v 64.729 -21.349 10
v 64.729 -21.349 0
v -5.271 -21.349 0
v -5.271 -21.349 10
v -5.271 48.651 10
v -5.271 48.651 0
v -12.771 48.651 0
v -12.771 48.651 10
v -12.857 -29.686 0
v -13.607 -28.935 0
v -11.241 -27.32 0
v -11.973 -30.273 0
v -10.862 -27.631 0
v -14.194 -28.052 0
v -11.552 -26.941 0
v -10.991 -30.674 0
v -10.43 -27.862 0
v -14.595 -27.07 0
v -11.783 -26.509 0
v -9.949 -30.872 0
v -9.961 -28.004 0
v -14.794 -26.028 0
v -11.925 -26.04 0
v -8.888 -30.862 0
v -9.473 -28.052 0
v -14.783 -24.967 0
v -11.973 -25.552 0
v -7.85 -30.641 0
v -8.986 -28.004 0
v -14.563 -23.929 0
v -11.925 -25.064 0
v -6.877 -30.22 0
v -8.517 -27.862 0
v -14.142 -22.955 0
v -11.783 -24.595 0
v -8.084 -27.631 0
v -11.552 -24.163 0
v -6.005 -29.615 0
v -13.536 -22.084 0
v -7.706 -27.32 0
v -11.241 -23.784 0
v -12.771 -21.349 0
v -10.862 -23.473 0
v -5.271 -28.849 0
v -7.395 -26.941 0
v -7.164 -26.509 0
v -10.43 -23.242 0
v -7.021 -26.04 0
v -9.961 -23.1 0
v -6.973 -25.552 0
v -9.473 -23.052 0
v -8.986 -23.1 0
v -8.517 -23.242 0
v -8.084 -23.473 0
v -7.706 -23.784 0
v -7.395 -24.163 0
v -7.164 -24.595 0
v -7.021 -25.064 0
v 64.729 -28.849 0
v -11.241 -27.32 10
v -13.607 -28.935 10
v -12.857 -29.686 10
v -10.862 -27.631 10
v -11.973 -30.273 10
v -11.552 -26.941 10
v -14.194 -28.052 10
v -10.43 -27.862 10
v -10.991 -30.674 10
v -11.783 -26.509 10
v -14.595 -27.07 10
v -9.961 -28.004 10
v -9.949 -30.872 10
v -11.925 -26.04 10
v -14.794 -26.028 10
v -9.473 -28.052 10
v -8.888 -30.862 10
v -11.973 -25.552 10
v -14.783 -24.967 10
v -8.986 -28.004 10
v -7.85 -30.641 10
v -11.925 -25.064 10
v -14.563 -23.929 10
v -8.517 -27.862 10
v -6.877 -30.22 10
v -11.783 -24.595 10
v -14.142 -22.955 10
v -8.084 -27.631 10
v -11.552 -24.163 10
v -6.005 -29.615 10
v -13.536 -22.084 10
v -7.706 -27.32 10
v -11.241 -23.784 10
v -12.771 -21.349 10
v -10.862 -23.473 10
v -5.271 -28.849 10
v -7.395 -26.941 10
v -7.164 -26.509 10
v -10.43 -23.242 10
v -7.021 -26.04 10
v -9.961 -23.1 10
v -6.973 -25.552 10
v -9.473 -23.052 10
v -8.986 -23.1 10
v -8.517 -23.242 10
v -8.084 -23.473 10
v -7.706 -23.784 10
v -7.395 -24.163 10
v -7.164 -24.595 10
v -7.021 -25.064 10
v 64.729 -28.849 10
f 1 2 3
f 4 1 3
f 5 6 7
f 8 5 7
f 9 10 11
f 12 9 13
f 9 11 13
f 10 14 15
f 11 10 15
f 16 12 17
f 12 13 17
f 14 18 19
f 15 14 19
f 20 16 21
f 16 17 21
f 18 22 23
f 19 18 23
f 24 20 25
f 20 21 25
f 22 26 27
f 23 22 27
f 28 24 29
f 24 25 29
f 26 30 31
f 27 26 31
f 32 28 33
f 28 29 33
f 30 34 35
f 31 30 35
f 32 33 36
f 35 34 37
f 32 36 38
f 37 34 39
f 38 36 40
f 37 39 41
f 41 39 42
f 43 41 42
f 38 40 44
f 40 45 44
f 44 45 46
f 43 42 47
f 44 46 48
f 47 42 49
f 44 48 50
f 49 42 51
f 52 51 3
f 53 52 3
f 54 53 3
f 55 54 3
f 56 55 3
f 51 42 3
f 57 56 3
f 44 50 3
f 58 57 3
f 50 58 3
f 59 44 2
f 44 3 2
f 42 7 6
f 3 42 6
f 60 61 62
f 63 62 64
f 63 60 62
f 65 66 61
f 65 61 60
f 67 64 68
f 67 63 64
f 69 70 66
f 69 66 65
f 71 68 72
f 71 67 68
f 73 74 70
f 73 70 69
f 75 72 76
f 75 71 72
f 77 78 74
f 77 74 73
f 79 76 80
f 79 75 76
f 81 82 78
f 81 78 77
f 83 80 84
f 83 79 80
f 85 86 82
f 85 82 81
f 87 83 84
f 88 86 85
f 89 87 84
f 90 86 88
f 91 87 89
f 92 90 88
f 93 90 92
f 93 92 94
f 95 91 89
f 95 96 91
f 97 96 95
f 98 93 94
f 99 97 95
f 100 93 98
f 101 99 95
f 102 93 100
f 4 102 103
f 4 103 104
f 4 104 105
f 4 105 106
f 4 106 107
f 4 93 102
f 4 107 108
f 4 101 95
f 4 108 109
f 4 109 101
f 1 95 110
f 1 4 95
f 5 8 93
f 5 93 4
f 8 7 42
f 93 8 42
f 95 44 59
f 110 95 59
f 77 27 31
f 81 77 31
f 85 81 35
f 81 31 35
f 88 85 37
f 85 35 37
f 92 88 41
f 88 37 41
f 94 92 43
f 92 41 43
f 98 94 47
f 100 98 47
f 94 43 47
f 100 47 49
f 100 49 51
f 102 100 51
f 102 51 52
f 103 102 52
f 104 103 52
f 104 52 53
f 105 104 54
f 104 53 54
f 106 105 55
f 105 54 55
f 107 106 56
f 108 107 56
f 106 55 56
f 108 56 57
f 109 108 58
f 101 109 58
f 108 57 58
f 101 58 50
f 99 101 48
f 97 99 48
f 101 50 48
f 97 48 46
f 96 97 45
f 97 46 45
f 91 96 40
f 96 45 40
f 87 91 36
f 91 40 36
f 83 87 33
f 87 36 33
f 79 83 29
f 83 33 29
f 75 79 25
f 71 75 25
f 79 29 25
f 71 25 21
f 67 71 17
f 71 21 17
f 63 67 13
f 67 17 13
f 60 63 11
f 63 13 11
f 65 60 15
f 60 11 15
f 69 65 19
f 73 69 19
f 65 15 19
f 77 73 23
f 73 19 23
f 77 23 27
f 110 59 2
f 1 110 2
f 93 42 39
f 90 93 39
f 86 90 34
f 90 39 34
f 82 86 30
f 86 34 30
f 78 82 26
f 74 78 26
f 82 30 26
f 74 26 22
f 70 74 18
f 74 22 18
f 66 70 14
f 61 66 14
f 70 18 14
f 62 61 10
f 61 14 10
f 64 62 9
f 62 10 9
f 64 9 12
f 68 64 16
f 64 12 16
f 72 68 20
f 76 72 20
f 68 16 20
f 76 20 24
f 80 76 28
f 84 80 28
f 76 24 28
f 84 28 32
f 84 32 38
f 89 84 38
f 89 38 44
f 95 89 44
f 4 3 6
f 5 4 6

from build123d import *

# Parameters (mm, degrees)
BOSS_EXTRUDE2_DEPTH = 10
SKETCH2_R           = 2.5
CUT_EXTRUDE1_DEPTH  = 10


with BuildPart() as part:
    # Sketch1 → Boss-Extrude2 (new body)
    with BuildSketch(Plane.XY):
        with BuildLine():
            Line((-12.770888736, 48.650584459), (-12.770888736, -21.349415541))
            ThreePointArc((-12.770888736, -21.349415541), (-13.250610219, -29.329137023), (-5.270888736, -28.849415541))
            Line((-5.270888736, -28.849415541), (64.729111264, -28.849415541))
            Line((64.729111264, -28.849415541), (64.729111264, -21.349415541))
            Line((64.729111264, -21.349415541), (-5.270888736, -21.349415541))
            Line((-5.270888736, -21.349415541), (-5.270888736, 48.650584459))
            Line((-5.270888736, 48.650584459), (-12.770888736, 48.650584459))
        make_face()
    extrude(amount=BOSS_EXTRUDE2_DEPTH)

    # Sketch2 → Cut-Extrude1 (cut)
    with BuildSketch(Plane(origin=(0, 0, 0), x_dir=(-1, 0, 0), z_dir=(0, 0, -1))):
        with Locations((9.47340598, -25.551932785)):
            Circle(SKETCH2_R)
    extrude(amount=-CUT_EXTRUDE1_DEPTH, mode=Mode.SUBTRACT)


solid = part.part
